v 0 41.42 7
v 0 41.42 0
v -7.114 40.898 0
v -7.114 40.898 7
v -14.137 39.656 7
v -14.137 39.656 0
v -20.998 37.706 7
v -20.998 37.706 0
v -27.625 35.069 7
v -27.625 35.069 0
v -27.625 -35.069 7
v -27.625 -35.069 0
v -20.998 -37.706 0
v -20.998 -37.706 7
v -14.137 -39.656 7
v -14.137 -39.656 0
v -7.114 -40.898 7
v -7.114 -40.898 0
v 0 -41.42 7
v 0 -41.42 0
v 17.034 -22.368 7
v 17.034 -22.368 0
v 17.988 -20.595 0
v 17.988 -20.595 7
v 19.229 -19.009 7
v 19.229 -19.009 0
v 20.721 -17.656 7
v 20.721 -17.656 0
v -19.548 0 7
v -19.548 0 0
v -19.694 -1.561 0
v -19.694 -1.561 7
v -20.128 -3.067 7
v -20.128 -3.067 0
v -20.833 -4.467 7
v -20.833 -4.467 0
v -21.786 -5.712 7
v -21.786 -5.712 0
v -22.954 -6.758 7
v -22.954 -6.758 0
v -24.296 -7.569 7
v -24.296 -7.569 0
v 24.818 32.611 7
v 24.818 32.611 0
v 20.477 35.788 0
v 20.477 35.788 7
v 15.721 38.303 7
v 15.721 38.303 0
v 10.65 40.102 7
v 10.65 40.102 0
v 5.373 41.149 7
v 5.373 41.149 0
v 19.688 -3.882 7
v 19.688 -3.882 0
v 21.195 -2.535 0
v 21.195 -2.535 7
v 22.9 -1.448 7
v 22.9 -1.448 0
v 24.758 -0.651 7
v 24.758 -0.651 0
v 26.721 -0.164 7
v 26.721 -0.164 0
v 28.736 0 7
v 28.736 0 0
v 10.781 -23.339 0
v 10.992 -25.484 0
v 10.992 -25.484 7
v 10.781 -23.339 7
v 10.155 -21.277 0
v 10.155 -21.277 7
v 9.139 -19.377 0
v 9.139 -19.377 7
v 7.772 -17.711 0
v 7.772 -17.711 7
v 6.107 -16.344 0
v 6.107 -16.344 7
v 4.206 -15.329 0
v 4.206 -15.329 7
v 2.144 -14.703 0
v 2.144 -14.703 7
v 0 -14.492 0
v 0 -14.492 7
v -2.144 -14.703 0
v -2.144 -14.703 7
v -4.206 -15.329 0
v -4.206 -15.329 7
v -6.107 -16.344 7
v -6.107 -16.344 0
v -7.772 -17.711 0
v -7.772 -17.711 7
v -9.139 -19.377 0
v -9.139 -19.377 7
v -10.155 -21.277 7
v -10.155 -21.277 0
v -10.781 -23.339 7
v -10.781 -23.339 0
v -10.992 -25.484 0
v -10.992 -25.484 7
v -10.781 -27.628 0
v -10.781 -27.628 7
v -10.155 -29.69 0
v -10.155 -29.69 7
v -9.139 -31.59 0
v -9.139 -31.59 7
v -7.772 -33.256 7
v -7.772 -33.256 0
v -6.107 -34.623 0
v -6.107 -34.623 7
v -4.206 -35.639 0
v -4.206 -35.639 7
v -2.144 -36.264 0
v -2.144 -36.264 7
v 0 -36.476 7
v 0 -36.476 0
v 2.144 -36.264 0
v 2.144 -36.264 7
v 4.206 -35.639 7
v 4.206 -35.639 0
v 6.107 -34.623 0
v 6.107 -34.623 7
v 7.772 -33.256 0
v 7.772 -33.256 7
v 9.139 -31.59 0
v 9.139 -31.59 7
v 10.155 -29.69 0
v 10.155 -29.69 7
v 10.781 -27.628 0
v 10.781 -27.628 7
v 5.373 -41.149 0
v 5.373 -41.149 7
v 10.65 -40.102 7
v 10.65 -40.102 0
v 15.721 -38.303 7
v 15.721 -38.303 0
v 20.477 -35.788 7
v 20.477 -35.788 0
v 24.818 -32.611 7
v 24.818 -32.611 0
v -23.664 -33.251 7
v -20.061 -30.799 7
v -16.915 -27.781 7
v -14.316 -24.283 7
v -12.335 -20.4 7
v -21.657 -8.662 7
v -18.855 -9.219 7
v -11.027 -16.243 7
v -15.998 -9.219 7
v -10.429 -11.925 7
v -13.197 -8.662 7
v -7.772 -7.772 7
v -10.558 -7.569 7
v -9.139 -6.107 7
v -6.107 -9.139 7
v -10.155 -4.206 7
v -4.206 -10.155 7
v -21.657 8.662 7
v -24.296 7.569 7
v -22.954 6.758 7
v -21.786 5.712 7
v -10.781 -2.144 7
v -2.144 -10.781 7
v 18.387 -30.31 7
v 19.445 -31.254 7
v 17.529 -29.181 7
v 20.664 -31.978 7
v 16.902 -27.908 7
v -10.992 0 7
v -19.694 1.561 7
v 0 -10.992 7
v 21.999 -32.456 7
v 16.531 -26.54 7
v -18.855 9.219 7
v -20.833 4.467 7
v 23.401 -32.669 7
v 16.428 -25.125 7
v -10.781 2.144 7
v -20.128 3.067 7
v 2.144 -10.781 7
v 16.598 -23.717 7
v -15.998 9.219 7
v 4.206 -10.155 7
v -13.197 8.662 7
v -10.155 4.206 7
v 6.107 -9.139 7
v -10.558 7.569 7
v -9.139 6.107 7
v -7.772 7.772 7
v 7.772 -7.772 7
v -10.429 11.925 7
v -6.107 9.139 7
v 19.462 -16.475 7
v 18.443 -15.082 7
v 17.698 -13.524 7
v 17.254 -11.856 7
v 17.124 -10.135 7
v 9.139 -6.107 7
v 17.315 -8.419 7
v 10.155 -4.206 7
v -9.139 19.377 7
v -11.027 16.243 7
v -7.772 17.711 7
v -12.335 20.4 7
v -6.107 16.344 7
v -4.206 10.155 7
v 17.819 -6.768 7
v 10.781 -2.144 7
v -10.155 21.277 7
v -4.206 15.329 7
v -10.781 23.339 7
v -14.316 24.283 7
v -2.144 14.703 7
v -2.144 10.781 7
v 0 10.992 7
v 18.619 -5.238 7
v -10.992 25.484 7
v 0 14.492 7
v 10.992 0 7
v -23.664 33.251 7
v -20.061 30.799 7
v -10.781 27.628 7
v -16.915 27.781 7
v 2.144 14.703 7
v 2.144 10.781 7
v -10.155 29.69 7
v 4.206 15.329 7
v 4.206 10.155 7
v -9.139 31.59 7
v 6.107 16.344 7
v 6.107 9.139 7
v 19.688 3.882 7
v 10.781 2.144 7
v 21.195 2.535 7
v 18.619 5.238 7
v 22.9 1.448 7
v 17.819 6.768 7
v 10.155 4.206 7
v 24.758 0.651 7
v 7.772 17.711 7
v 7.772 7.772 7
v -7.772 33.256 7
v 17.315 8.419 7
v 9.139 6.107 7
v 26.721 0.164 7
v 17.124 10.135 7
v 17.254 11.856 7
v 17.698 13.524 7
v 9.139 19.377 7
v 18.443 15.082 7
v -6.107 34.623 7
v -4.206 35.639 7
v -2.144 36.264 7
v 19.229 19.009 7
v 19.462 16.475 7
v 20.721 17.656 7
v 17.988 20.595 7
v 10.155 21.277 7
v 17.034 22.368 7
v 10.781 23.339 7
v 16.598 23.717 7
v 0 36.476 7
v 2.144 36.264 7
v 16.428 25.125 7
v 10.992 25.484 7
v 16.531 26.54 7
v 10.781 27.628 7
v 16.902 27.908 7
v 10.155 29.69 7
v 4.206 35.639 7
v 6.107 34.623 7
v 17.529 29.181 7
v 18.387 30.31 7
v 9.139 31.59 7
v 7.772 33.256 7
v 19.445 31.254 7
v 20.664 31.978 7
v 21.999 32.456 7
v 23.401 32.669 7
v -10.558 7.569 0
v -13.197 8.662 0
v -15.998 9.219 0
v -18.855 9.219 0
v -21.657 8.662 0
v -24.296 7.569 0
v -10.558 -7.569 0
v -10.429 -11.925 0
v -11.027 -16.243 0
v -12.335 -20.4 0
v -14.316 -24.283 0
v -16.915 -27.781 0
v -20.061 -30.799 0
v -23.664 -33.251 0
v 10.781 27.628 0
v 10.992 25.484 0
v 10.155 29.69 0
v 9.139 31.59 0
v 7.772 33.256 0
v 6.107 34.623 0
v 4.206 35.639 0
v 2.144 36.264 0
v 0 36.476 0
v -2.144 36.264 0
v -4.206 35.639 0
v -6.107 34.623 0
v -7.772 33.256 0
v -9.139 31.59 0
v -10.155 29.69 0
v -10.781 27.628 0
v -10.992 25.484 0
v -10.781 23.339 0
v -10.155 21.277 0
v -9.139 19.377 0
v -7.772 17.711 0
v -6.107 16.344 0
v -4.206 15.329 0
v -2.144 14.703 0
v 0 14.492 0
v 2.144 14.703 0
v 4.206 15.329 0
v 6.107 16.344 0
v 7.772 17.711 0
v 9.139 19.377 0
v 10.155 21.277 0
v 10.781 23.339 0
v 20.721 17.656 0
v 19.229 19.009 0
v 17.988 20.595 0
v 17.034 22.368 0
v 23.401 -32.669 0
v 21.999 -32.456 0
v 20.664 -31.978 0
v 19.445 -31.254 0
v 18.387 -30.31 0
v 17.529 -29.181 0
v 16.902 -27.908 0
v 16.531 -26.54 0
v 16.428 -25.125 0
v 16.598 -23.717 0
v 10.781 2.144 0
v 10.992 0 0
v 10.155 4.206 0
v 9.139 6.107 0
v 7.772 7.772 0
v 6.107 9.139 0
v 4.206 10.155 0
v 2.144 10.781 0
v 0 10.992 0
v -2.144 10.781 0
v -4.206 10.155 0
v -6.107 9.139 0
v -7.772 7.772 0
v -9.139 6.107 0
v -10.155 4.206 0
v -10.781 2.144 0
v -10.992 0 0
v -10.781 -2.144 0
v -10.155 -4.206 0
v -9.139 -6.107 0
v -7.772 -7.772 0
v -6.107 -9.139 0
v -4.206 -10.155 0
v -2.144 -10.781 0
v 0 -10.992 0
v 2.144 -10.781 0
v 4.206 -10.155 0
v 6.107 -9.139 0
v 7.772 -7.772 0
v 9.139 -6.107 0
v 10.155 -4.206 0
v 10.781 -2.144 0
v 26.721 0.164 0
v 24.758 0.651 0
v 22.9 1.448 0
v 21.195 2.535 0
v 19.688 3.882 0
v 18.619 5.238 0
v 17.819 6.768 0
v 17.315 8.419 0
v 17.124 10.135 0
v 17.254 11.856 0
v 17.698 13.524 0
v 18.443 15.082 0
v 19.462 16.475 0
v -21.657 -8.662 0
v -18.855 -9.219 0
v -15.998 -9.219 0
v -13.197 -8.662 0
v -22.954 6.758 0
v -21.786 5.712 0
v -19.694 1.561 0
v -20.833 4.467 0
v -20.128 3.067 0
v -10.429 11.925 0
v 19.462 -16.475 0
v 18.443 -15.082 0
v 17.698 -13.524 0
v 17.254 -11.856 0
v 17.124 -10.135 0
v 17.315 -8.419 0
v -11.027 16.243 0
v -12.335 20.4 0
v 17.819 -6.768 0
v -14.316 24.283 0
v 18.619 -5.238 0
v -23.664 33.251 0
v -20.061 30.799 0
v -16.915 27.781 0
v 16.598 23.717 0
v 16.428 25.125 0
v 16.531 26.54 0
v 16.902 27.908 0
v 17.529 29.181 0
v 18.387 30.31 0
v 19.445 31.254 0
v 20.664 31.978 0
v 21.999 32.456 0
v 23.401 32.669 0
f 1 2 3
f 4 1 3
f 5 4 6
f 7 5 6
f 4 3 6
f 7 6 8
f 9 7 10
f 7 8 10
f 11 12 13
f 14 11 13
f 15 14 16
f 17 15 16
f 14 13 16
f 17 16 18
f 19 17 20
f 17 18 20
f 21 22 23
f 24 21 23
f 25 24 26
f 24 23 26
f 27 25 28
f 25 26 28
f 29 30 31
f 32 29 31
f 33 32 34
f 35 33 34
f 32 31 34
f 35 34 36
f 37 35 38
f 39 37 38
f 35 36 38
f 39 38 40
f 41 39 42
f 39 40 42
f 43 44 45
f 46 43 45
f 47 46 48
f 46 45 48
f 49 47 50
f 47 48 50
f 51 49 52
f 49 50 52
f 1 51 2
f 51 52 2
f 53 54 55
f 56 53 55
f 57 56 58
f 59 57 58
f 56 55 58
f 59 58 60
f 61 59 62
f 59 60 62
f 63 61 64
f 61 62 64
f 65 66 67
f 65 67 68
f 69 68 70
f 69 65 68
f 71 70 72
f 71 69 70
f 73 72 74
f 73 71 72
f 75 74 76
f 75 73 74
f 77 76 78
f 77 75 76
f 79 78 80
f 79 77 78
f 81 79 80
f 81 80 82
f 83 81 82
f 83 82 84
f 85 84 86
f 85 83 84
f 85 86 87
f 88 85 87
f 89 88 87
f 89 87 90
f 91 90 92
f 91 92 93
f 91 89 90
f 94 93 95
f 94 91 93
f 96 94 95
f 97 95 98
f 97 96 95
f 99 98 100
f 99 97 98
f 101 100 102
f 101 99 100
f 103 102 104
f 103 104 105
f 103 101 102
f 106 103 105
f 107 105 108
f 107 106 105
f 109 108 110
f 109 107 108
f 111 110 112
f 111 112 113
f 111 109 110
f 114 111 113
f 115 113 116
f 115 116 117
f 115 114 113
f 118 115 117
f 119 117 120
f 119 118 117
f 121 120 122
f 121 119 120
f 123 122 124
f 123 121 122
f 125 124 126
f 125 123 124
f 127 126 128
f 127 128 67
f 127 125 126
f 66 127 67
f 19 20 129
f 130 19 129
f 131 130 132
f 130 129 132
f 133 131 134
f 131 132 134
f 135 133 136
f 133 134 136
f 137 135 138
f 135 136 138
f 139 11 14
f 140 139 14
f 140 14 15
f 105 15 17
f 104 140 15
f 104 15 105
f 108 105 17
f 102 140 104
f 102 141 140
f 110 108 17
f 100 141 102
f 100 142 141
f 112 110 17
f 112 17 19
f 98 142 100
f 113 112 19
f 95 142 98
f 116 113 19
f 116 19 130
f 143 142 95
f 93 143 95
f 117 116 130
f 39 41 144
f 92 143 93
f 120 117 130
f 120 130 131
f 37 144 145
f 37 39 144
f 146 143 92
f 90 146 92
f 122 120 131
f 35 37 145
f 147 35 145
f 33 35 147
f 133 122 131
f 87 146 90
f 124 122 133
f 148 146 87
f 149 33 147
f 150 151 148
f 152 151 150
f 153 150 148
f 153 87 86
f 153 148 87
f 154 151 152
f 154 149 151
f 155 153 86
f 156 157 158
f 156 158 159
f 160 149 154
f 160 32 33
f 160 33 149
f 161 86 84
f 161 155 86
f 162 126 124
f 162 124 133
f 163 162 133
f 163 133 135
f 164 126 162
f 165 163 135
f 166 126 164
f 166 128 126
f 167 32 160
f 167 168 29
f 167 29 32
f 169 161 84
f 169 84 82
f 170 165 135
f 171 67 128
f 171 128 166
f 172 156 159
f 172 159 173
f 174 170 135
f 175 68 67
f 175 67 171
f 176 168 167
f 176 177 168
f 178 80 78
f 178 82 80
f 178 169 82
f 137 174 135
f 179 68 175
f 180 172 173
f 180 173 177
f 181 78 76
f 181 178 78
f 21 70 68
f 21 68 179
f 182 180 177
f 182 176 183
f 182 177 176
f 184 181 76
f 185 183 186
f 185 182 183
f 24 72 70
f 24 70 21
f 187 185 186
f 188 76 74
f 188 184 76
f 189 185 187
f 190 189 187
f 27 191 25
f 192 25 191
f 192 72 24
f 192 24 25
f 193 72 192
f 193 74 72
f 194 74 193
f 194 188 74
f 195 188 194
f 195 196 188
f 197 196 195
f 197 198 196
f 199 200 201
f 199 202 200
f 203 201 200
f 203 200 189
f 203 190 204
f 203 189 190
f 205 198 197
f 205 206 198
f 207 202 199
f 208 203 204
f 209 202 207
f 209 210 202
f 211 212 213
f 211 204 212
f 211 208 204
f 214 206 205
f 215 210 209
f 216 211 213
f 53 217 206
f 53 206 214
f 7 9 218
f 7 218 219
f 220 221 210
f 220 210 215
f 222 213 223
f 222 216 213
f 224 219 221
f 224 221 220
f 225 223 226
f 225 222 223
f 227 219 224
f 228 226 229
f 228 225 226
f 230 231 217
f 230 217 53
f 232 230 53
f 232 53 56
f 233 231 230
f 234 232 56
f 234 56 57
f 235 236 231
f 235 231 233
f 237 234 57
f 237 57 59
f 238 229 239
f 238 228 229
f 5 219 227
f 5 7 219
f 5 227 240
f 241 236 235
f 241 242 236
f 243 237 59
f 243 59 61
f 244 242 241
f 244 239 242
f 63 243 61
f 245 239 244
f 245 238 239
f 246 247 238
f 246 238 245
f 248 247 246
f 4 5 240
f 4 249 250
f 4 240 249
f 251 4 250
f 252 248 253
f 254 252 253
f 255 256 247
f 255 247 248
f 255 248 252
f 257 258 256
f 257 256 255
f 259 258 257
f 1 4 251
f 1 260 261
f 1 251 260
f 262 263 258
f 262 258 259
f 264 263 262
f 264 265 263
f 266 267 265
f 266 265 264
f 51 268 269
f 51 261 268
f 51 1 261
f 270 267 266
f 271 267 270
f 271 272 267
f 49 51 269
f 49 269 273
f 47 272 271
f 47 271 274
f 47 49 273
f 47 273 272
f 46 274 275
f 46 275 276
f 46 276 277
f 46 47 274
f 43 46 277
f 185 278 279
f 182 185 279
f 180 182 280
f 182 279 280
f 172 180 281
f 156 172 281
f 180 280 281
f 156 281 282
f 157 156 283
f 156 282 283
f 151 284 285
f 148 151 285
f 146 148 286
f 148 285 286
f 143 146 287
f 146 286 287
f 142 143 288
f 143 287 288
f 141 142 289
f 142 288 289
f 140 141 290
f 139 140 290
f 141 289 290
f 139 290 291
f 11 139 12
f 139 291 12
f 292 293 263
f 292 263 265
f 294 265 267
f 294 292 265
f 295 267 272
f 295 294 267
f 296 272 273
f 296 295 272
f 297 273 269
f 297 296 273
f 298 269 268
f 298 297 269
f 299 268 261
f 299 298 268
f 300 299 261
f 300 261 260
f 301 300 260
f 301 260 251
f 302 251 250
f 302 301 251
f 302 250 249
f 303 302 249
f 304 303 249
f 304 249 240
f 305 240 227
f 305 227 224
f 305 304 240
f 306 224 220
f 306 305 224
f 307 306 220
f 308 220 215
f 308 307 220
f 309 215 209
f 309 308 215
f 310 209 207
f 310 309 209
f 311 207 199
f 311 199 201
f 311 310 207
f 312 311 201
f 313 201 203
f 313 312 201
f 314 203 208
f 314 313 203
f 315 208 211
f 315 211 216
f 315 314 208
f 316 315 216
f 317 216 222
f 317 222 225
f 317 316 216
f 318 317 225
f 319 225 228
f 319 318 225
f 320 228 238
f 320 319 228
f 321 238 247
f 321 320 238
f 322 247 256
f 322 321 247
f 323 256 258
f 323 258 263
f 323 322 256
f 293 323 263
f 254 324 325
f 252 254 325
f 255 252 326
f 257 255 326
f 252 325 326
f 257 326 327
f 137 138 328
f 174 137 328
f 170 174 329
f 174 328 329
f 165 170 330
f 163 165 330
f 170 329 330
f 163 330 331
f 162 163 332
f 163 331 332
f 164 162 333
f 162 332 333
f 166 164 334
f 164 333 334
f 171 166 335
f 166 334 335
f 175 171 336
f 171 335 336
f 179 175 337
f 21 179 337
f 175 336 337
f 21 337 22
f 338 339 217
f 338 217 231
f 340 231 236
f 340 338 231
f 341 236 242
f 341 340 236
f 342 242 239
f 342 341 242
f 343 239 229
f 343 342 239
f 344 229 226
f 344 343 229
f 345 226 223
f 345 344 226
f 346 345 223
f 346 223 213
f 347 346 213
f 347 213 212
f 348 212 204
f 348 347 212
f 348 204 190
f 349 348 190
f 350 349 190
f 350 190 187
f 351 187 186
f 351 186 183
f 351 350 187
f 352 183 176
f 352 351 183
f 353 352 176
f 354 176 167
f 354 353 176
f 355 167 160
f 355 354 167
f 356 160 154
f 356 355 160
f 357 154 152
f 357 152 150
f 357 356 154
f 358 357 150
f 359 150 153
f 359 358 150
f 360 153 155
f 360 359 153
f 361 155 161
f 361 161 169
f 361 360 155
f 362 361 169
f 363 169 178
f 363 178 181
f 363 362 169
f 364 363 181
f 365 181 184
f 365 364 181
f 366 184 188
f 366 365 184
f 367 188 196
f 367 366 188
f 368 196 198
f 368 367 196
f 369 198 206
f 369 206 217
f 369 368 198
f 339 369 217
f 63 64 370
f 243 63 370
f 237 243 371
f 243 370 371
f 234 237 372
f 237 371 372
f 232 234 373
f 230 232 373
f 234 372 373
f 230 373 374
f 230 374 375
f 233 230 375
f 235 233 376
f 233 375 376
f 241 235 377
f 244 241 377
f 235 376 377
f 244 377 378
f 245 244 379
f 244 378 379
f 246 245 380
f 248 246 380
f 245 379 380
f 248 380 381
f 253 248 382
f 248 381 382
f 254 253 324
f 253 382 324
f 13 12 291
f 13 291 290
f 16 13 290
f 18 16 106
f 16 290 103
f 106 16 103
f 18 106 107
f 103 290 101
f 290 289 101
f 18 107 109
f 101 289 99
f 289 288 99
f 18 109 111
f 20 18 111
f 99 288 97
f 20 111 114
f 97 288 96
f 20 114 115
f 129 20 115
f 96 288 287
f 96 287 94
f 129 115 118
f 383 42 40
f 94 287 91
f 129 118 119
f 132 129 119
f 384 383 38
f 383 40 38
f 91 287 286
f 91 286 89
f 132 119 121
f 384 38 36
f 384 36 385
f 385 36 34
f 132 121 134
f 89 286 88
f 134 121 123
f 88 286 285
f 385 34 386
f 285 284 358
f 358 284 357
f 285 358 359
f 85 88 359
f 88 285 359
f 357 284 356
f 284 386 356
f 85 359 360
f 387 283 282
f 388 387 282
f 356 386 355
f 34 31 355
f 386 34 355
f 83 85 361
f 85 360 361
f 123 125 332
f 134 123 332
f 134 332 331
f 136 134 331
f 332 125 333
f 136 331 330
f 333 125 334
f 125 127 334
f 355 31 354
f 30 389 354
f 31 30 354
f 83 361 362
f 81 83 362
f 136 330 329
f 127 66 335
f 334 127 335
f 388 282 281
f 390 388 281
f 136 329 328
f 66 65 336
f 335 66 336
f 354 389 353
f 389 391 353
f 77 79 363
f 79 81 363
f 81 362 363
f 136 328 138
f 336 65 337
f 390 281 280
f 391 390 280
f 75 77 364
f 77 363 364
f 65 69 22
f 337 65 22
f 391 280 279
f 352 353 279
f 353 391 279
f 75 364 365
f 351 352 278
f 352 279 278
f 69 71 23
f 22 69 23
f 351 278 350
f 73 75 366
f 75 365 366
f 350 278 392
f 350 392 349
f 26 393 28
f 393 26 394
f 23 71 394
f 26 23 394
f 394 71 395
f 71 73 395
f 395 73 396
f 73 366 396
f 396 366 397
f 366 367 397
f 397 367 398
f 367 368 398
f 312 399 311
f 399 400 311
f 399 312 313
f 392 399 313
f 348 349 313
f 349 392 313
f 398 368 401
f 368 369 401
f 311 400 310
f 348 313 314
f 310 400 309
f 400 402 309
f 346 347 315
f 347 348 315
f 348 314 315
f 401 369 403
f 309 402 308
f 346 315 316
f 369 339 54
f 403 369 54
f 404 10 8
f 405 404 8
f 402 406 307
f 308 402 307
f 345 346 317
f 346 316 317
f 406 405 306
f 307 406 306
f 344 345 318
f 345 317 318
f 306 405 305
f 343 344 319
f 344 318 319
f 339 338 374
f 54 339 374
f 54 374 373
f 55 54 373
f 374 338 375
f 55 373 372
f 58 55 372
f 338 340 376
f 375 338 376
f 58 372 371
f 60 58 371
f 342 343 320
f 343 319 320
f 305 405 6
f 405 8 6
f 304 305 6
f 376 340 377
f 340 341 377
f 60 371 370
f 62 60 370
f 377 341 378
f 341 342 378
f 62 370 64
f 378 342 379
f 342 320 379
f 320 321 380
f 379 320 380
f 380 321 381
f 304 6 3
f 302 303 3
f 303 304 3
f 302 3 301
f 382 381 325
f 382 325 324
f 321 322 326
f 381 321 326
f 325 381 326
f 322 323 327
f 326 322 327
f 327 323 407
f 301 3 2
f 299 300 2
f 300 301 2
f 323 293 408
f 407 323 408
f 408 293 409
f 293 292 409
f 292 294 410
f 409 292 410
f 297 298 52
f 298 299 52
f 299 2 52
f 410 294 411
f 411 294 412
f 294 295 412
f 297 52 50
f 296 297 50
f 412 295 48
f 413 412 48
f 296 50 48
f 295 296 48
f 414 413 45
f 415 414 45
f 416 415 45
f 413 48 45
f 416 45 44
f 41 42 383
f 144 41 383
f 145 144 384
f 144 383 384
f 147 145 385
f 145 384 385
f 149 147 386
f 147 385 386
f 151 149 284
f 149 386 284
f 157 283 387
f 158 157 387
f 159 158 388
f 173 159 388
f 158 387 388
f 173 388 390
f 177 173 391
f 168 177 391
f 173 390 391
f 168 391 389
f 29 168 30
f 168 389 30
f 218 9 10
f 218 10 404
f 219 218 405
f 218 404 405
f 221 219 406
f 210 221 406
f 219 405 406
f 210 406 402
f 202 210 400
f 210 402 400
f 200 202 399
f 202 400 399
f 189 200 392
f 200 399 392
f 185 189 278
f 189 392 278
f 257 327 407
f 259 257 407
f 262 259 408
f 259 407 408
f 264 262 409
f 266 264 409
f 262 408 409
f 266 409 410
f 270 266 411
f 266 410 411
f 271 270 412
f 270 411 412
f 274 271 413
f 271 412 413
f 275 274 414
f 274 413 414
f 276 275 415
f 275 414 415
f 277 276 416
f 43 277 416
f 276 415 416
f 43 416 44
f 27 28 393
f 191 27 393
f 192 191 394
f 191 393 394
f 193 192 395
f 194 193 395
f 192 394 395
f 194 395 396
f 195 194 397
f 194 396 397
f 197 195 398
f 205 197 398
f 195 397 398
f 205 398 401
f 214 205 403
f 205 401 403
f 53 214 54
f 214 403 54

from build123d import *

# Parameters (mm, degrees)
F1_R     = 10.99185
F2_DEPTH = 7


with BuildPart() as f2:
    # F1 (on Top) → F2 (new body)
    with BuildSketch(Plane.XY):
        with BuildLine():
            ThreePointArc((17.033685, 22.367952), (17.930632, 29.765852), (24.81827, 32.610826))
            ThreePointArc((24.81827, 32.610826), (13.218162, 39.29463), (0, 41.419696))
            ThreePointArc((0, 41.419696), (-14.137149, 39.656123), (-27.625239, 35.069115))
            ThreePointArc((-27.625239, 35.069115), (-14.315963, 24.282618), (-10.557758, 7.568515))
            ThreePointArc((-10.557758, 7.568515), (-17.42666, 9.289489), (-24.295563, 7.568515))
            ThreePointArc((-24.295563, 7.568515), (-20.833353, 4.467062), (-19.548337, 0))
            ThreePointArc((-19.548337, 0), (-20.833353, -4.467062), (-24.295563, -7.568515))
            ThreePointArc((-24.295563, -7.568515), (-17.42666, -9.289489), (-10.557758, -7.568515))
            ThreePointArc((-10.557758, -7.568515), (-14.315963, -24.282618), (-27.625239, -35.069115))
            ThreePointArc((-27.625239, -35.069115), (-14.137149, -39.656123), (0, -41.419696))
            ThreePointArc((0, -41.419696), (13.218162, -39.29463), (24.81827, -32.610826))
            ThreePointArc((24.81827, -32.610826), (17.930632, -29.765852), (17.033685, -22.367952))
            ThreePointArc((17.033685, -22.367952), (18.574811, -19.775282), (20.721119, -17.656233))
            ThreePointArc((20.721119, -17.656233), (17.149082, -10.998468), (19.687688, -3.882235))
            ThreePointArc((19.687688, -3.882235), (23.813117, -1.011532), (28.736215, 0))
            ThreePointArc((28.736215, 0), (23.813117, 1.011532), (19.687688, 3.882235))
            ThreePointArc((19.687688, 3.882235), (17.149082, 10.998468), (20.721119, 17.656233))
            ThreePointArc((20.721119, 17.656233), (18.574811, 19.775282), (17.033685, 22.367952))
        make_face()
        with Locations((0, -25.4837)):
            Circle(F1_R, mode=Mode.SUBTRACT)
        Circle(F1_R, mode=Mode.SUBTRACT)
        with Locations((0, 25.4837)):
            Circle(F1_R, mode=Mode.SUBTRACT)
    extrude(amount=F2_DEPTH)


solid = f2.part
